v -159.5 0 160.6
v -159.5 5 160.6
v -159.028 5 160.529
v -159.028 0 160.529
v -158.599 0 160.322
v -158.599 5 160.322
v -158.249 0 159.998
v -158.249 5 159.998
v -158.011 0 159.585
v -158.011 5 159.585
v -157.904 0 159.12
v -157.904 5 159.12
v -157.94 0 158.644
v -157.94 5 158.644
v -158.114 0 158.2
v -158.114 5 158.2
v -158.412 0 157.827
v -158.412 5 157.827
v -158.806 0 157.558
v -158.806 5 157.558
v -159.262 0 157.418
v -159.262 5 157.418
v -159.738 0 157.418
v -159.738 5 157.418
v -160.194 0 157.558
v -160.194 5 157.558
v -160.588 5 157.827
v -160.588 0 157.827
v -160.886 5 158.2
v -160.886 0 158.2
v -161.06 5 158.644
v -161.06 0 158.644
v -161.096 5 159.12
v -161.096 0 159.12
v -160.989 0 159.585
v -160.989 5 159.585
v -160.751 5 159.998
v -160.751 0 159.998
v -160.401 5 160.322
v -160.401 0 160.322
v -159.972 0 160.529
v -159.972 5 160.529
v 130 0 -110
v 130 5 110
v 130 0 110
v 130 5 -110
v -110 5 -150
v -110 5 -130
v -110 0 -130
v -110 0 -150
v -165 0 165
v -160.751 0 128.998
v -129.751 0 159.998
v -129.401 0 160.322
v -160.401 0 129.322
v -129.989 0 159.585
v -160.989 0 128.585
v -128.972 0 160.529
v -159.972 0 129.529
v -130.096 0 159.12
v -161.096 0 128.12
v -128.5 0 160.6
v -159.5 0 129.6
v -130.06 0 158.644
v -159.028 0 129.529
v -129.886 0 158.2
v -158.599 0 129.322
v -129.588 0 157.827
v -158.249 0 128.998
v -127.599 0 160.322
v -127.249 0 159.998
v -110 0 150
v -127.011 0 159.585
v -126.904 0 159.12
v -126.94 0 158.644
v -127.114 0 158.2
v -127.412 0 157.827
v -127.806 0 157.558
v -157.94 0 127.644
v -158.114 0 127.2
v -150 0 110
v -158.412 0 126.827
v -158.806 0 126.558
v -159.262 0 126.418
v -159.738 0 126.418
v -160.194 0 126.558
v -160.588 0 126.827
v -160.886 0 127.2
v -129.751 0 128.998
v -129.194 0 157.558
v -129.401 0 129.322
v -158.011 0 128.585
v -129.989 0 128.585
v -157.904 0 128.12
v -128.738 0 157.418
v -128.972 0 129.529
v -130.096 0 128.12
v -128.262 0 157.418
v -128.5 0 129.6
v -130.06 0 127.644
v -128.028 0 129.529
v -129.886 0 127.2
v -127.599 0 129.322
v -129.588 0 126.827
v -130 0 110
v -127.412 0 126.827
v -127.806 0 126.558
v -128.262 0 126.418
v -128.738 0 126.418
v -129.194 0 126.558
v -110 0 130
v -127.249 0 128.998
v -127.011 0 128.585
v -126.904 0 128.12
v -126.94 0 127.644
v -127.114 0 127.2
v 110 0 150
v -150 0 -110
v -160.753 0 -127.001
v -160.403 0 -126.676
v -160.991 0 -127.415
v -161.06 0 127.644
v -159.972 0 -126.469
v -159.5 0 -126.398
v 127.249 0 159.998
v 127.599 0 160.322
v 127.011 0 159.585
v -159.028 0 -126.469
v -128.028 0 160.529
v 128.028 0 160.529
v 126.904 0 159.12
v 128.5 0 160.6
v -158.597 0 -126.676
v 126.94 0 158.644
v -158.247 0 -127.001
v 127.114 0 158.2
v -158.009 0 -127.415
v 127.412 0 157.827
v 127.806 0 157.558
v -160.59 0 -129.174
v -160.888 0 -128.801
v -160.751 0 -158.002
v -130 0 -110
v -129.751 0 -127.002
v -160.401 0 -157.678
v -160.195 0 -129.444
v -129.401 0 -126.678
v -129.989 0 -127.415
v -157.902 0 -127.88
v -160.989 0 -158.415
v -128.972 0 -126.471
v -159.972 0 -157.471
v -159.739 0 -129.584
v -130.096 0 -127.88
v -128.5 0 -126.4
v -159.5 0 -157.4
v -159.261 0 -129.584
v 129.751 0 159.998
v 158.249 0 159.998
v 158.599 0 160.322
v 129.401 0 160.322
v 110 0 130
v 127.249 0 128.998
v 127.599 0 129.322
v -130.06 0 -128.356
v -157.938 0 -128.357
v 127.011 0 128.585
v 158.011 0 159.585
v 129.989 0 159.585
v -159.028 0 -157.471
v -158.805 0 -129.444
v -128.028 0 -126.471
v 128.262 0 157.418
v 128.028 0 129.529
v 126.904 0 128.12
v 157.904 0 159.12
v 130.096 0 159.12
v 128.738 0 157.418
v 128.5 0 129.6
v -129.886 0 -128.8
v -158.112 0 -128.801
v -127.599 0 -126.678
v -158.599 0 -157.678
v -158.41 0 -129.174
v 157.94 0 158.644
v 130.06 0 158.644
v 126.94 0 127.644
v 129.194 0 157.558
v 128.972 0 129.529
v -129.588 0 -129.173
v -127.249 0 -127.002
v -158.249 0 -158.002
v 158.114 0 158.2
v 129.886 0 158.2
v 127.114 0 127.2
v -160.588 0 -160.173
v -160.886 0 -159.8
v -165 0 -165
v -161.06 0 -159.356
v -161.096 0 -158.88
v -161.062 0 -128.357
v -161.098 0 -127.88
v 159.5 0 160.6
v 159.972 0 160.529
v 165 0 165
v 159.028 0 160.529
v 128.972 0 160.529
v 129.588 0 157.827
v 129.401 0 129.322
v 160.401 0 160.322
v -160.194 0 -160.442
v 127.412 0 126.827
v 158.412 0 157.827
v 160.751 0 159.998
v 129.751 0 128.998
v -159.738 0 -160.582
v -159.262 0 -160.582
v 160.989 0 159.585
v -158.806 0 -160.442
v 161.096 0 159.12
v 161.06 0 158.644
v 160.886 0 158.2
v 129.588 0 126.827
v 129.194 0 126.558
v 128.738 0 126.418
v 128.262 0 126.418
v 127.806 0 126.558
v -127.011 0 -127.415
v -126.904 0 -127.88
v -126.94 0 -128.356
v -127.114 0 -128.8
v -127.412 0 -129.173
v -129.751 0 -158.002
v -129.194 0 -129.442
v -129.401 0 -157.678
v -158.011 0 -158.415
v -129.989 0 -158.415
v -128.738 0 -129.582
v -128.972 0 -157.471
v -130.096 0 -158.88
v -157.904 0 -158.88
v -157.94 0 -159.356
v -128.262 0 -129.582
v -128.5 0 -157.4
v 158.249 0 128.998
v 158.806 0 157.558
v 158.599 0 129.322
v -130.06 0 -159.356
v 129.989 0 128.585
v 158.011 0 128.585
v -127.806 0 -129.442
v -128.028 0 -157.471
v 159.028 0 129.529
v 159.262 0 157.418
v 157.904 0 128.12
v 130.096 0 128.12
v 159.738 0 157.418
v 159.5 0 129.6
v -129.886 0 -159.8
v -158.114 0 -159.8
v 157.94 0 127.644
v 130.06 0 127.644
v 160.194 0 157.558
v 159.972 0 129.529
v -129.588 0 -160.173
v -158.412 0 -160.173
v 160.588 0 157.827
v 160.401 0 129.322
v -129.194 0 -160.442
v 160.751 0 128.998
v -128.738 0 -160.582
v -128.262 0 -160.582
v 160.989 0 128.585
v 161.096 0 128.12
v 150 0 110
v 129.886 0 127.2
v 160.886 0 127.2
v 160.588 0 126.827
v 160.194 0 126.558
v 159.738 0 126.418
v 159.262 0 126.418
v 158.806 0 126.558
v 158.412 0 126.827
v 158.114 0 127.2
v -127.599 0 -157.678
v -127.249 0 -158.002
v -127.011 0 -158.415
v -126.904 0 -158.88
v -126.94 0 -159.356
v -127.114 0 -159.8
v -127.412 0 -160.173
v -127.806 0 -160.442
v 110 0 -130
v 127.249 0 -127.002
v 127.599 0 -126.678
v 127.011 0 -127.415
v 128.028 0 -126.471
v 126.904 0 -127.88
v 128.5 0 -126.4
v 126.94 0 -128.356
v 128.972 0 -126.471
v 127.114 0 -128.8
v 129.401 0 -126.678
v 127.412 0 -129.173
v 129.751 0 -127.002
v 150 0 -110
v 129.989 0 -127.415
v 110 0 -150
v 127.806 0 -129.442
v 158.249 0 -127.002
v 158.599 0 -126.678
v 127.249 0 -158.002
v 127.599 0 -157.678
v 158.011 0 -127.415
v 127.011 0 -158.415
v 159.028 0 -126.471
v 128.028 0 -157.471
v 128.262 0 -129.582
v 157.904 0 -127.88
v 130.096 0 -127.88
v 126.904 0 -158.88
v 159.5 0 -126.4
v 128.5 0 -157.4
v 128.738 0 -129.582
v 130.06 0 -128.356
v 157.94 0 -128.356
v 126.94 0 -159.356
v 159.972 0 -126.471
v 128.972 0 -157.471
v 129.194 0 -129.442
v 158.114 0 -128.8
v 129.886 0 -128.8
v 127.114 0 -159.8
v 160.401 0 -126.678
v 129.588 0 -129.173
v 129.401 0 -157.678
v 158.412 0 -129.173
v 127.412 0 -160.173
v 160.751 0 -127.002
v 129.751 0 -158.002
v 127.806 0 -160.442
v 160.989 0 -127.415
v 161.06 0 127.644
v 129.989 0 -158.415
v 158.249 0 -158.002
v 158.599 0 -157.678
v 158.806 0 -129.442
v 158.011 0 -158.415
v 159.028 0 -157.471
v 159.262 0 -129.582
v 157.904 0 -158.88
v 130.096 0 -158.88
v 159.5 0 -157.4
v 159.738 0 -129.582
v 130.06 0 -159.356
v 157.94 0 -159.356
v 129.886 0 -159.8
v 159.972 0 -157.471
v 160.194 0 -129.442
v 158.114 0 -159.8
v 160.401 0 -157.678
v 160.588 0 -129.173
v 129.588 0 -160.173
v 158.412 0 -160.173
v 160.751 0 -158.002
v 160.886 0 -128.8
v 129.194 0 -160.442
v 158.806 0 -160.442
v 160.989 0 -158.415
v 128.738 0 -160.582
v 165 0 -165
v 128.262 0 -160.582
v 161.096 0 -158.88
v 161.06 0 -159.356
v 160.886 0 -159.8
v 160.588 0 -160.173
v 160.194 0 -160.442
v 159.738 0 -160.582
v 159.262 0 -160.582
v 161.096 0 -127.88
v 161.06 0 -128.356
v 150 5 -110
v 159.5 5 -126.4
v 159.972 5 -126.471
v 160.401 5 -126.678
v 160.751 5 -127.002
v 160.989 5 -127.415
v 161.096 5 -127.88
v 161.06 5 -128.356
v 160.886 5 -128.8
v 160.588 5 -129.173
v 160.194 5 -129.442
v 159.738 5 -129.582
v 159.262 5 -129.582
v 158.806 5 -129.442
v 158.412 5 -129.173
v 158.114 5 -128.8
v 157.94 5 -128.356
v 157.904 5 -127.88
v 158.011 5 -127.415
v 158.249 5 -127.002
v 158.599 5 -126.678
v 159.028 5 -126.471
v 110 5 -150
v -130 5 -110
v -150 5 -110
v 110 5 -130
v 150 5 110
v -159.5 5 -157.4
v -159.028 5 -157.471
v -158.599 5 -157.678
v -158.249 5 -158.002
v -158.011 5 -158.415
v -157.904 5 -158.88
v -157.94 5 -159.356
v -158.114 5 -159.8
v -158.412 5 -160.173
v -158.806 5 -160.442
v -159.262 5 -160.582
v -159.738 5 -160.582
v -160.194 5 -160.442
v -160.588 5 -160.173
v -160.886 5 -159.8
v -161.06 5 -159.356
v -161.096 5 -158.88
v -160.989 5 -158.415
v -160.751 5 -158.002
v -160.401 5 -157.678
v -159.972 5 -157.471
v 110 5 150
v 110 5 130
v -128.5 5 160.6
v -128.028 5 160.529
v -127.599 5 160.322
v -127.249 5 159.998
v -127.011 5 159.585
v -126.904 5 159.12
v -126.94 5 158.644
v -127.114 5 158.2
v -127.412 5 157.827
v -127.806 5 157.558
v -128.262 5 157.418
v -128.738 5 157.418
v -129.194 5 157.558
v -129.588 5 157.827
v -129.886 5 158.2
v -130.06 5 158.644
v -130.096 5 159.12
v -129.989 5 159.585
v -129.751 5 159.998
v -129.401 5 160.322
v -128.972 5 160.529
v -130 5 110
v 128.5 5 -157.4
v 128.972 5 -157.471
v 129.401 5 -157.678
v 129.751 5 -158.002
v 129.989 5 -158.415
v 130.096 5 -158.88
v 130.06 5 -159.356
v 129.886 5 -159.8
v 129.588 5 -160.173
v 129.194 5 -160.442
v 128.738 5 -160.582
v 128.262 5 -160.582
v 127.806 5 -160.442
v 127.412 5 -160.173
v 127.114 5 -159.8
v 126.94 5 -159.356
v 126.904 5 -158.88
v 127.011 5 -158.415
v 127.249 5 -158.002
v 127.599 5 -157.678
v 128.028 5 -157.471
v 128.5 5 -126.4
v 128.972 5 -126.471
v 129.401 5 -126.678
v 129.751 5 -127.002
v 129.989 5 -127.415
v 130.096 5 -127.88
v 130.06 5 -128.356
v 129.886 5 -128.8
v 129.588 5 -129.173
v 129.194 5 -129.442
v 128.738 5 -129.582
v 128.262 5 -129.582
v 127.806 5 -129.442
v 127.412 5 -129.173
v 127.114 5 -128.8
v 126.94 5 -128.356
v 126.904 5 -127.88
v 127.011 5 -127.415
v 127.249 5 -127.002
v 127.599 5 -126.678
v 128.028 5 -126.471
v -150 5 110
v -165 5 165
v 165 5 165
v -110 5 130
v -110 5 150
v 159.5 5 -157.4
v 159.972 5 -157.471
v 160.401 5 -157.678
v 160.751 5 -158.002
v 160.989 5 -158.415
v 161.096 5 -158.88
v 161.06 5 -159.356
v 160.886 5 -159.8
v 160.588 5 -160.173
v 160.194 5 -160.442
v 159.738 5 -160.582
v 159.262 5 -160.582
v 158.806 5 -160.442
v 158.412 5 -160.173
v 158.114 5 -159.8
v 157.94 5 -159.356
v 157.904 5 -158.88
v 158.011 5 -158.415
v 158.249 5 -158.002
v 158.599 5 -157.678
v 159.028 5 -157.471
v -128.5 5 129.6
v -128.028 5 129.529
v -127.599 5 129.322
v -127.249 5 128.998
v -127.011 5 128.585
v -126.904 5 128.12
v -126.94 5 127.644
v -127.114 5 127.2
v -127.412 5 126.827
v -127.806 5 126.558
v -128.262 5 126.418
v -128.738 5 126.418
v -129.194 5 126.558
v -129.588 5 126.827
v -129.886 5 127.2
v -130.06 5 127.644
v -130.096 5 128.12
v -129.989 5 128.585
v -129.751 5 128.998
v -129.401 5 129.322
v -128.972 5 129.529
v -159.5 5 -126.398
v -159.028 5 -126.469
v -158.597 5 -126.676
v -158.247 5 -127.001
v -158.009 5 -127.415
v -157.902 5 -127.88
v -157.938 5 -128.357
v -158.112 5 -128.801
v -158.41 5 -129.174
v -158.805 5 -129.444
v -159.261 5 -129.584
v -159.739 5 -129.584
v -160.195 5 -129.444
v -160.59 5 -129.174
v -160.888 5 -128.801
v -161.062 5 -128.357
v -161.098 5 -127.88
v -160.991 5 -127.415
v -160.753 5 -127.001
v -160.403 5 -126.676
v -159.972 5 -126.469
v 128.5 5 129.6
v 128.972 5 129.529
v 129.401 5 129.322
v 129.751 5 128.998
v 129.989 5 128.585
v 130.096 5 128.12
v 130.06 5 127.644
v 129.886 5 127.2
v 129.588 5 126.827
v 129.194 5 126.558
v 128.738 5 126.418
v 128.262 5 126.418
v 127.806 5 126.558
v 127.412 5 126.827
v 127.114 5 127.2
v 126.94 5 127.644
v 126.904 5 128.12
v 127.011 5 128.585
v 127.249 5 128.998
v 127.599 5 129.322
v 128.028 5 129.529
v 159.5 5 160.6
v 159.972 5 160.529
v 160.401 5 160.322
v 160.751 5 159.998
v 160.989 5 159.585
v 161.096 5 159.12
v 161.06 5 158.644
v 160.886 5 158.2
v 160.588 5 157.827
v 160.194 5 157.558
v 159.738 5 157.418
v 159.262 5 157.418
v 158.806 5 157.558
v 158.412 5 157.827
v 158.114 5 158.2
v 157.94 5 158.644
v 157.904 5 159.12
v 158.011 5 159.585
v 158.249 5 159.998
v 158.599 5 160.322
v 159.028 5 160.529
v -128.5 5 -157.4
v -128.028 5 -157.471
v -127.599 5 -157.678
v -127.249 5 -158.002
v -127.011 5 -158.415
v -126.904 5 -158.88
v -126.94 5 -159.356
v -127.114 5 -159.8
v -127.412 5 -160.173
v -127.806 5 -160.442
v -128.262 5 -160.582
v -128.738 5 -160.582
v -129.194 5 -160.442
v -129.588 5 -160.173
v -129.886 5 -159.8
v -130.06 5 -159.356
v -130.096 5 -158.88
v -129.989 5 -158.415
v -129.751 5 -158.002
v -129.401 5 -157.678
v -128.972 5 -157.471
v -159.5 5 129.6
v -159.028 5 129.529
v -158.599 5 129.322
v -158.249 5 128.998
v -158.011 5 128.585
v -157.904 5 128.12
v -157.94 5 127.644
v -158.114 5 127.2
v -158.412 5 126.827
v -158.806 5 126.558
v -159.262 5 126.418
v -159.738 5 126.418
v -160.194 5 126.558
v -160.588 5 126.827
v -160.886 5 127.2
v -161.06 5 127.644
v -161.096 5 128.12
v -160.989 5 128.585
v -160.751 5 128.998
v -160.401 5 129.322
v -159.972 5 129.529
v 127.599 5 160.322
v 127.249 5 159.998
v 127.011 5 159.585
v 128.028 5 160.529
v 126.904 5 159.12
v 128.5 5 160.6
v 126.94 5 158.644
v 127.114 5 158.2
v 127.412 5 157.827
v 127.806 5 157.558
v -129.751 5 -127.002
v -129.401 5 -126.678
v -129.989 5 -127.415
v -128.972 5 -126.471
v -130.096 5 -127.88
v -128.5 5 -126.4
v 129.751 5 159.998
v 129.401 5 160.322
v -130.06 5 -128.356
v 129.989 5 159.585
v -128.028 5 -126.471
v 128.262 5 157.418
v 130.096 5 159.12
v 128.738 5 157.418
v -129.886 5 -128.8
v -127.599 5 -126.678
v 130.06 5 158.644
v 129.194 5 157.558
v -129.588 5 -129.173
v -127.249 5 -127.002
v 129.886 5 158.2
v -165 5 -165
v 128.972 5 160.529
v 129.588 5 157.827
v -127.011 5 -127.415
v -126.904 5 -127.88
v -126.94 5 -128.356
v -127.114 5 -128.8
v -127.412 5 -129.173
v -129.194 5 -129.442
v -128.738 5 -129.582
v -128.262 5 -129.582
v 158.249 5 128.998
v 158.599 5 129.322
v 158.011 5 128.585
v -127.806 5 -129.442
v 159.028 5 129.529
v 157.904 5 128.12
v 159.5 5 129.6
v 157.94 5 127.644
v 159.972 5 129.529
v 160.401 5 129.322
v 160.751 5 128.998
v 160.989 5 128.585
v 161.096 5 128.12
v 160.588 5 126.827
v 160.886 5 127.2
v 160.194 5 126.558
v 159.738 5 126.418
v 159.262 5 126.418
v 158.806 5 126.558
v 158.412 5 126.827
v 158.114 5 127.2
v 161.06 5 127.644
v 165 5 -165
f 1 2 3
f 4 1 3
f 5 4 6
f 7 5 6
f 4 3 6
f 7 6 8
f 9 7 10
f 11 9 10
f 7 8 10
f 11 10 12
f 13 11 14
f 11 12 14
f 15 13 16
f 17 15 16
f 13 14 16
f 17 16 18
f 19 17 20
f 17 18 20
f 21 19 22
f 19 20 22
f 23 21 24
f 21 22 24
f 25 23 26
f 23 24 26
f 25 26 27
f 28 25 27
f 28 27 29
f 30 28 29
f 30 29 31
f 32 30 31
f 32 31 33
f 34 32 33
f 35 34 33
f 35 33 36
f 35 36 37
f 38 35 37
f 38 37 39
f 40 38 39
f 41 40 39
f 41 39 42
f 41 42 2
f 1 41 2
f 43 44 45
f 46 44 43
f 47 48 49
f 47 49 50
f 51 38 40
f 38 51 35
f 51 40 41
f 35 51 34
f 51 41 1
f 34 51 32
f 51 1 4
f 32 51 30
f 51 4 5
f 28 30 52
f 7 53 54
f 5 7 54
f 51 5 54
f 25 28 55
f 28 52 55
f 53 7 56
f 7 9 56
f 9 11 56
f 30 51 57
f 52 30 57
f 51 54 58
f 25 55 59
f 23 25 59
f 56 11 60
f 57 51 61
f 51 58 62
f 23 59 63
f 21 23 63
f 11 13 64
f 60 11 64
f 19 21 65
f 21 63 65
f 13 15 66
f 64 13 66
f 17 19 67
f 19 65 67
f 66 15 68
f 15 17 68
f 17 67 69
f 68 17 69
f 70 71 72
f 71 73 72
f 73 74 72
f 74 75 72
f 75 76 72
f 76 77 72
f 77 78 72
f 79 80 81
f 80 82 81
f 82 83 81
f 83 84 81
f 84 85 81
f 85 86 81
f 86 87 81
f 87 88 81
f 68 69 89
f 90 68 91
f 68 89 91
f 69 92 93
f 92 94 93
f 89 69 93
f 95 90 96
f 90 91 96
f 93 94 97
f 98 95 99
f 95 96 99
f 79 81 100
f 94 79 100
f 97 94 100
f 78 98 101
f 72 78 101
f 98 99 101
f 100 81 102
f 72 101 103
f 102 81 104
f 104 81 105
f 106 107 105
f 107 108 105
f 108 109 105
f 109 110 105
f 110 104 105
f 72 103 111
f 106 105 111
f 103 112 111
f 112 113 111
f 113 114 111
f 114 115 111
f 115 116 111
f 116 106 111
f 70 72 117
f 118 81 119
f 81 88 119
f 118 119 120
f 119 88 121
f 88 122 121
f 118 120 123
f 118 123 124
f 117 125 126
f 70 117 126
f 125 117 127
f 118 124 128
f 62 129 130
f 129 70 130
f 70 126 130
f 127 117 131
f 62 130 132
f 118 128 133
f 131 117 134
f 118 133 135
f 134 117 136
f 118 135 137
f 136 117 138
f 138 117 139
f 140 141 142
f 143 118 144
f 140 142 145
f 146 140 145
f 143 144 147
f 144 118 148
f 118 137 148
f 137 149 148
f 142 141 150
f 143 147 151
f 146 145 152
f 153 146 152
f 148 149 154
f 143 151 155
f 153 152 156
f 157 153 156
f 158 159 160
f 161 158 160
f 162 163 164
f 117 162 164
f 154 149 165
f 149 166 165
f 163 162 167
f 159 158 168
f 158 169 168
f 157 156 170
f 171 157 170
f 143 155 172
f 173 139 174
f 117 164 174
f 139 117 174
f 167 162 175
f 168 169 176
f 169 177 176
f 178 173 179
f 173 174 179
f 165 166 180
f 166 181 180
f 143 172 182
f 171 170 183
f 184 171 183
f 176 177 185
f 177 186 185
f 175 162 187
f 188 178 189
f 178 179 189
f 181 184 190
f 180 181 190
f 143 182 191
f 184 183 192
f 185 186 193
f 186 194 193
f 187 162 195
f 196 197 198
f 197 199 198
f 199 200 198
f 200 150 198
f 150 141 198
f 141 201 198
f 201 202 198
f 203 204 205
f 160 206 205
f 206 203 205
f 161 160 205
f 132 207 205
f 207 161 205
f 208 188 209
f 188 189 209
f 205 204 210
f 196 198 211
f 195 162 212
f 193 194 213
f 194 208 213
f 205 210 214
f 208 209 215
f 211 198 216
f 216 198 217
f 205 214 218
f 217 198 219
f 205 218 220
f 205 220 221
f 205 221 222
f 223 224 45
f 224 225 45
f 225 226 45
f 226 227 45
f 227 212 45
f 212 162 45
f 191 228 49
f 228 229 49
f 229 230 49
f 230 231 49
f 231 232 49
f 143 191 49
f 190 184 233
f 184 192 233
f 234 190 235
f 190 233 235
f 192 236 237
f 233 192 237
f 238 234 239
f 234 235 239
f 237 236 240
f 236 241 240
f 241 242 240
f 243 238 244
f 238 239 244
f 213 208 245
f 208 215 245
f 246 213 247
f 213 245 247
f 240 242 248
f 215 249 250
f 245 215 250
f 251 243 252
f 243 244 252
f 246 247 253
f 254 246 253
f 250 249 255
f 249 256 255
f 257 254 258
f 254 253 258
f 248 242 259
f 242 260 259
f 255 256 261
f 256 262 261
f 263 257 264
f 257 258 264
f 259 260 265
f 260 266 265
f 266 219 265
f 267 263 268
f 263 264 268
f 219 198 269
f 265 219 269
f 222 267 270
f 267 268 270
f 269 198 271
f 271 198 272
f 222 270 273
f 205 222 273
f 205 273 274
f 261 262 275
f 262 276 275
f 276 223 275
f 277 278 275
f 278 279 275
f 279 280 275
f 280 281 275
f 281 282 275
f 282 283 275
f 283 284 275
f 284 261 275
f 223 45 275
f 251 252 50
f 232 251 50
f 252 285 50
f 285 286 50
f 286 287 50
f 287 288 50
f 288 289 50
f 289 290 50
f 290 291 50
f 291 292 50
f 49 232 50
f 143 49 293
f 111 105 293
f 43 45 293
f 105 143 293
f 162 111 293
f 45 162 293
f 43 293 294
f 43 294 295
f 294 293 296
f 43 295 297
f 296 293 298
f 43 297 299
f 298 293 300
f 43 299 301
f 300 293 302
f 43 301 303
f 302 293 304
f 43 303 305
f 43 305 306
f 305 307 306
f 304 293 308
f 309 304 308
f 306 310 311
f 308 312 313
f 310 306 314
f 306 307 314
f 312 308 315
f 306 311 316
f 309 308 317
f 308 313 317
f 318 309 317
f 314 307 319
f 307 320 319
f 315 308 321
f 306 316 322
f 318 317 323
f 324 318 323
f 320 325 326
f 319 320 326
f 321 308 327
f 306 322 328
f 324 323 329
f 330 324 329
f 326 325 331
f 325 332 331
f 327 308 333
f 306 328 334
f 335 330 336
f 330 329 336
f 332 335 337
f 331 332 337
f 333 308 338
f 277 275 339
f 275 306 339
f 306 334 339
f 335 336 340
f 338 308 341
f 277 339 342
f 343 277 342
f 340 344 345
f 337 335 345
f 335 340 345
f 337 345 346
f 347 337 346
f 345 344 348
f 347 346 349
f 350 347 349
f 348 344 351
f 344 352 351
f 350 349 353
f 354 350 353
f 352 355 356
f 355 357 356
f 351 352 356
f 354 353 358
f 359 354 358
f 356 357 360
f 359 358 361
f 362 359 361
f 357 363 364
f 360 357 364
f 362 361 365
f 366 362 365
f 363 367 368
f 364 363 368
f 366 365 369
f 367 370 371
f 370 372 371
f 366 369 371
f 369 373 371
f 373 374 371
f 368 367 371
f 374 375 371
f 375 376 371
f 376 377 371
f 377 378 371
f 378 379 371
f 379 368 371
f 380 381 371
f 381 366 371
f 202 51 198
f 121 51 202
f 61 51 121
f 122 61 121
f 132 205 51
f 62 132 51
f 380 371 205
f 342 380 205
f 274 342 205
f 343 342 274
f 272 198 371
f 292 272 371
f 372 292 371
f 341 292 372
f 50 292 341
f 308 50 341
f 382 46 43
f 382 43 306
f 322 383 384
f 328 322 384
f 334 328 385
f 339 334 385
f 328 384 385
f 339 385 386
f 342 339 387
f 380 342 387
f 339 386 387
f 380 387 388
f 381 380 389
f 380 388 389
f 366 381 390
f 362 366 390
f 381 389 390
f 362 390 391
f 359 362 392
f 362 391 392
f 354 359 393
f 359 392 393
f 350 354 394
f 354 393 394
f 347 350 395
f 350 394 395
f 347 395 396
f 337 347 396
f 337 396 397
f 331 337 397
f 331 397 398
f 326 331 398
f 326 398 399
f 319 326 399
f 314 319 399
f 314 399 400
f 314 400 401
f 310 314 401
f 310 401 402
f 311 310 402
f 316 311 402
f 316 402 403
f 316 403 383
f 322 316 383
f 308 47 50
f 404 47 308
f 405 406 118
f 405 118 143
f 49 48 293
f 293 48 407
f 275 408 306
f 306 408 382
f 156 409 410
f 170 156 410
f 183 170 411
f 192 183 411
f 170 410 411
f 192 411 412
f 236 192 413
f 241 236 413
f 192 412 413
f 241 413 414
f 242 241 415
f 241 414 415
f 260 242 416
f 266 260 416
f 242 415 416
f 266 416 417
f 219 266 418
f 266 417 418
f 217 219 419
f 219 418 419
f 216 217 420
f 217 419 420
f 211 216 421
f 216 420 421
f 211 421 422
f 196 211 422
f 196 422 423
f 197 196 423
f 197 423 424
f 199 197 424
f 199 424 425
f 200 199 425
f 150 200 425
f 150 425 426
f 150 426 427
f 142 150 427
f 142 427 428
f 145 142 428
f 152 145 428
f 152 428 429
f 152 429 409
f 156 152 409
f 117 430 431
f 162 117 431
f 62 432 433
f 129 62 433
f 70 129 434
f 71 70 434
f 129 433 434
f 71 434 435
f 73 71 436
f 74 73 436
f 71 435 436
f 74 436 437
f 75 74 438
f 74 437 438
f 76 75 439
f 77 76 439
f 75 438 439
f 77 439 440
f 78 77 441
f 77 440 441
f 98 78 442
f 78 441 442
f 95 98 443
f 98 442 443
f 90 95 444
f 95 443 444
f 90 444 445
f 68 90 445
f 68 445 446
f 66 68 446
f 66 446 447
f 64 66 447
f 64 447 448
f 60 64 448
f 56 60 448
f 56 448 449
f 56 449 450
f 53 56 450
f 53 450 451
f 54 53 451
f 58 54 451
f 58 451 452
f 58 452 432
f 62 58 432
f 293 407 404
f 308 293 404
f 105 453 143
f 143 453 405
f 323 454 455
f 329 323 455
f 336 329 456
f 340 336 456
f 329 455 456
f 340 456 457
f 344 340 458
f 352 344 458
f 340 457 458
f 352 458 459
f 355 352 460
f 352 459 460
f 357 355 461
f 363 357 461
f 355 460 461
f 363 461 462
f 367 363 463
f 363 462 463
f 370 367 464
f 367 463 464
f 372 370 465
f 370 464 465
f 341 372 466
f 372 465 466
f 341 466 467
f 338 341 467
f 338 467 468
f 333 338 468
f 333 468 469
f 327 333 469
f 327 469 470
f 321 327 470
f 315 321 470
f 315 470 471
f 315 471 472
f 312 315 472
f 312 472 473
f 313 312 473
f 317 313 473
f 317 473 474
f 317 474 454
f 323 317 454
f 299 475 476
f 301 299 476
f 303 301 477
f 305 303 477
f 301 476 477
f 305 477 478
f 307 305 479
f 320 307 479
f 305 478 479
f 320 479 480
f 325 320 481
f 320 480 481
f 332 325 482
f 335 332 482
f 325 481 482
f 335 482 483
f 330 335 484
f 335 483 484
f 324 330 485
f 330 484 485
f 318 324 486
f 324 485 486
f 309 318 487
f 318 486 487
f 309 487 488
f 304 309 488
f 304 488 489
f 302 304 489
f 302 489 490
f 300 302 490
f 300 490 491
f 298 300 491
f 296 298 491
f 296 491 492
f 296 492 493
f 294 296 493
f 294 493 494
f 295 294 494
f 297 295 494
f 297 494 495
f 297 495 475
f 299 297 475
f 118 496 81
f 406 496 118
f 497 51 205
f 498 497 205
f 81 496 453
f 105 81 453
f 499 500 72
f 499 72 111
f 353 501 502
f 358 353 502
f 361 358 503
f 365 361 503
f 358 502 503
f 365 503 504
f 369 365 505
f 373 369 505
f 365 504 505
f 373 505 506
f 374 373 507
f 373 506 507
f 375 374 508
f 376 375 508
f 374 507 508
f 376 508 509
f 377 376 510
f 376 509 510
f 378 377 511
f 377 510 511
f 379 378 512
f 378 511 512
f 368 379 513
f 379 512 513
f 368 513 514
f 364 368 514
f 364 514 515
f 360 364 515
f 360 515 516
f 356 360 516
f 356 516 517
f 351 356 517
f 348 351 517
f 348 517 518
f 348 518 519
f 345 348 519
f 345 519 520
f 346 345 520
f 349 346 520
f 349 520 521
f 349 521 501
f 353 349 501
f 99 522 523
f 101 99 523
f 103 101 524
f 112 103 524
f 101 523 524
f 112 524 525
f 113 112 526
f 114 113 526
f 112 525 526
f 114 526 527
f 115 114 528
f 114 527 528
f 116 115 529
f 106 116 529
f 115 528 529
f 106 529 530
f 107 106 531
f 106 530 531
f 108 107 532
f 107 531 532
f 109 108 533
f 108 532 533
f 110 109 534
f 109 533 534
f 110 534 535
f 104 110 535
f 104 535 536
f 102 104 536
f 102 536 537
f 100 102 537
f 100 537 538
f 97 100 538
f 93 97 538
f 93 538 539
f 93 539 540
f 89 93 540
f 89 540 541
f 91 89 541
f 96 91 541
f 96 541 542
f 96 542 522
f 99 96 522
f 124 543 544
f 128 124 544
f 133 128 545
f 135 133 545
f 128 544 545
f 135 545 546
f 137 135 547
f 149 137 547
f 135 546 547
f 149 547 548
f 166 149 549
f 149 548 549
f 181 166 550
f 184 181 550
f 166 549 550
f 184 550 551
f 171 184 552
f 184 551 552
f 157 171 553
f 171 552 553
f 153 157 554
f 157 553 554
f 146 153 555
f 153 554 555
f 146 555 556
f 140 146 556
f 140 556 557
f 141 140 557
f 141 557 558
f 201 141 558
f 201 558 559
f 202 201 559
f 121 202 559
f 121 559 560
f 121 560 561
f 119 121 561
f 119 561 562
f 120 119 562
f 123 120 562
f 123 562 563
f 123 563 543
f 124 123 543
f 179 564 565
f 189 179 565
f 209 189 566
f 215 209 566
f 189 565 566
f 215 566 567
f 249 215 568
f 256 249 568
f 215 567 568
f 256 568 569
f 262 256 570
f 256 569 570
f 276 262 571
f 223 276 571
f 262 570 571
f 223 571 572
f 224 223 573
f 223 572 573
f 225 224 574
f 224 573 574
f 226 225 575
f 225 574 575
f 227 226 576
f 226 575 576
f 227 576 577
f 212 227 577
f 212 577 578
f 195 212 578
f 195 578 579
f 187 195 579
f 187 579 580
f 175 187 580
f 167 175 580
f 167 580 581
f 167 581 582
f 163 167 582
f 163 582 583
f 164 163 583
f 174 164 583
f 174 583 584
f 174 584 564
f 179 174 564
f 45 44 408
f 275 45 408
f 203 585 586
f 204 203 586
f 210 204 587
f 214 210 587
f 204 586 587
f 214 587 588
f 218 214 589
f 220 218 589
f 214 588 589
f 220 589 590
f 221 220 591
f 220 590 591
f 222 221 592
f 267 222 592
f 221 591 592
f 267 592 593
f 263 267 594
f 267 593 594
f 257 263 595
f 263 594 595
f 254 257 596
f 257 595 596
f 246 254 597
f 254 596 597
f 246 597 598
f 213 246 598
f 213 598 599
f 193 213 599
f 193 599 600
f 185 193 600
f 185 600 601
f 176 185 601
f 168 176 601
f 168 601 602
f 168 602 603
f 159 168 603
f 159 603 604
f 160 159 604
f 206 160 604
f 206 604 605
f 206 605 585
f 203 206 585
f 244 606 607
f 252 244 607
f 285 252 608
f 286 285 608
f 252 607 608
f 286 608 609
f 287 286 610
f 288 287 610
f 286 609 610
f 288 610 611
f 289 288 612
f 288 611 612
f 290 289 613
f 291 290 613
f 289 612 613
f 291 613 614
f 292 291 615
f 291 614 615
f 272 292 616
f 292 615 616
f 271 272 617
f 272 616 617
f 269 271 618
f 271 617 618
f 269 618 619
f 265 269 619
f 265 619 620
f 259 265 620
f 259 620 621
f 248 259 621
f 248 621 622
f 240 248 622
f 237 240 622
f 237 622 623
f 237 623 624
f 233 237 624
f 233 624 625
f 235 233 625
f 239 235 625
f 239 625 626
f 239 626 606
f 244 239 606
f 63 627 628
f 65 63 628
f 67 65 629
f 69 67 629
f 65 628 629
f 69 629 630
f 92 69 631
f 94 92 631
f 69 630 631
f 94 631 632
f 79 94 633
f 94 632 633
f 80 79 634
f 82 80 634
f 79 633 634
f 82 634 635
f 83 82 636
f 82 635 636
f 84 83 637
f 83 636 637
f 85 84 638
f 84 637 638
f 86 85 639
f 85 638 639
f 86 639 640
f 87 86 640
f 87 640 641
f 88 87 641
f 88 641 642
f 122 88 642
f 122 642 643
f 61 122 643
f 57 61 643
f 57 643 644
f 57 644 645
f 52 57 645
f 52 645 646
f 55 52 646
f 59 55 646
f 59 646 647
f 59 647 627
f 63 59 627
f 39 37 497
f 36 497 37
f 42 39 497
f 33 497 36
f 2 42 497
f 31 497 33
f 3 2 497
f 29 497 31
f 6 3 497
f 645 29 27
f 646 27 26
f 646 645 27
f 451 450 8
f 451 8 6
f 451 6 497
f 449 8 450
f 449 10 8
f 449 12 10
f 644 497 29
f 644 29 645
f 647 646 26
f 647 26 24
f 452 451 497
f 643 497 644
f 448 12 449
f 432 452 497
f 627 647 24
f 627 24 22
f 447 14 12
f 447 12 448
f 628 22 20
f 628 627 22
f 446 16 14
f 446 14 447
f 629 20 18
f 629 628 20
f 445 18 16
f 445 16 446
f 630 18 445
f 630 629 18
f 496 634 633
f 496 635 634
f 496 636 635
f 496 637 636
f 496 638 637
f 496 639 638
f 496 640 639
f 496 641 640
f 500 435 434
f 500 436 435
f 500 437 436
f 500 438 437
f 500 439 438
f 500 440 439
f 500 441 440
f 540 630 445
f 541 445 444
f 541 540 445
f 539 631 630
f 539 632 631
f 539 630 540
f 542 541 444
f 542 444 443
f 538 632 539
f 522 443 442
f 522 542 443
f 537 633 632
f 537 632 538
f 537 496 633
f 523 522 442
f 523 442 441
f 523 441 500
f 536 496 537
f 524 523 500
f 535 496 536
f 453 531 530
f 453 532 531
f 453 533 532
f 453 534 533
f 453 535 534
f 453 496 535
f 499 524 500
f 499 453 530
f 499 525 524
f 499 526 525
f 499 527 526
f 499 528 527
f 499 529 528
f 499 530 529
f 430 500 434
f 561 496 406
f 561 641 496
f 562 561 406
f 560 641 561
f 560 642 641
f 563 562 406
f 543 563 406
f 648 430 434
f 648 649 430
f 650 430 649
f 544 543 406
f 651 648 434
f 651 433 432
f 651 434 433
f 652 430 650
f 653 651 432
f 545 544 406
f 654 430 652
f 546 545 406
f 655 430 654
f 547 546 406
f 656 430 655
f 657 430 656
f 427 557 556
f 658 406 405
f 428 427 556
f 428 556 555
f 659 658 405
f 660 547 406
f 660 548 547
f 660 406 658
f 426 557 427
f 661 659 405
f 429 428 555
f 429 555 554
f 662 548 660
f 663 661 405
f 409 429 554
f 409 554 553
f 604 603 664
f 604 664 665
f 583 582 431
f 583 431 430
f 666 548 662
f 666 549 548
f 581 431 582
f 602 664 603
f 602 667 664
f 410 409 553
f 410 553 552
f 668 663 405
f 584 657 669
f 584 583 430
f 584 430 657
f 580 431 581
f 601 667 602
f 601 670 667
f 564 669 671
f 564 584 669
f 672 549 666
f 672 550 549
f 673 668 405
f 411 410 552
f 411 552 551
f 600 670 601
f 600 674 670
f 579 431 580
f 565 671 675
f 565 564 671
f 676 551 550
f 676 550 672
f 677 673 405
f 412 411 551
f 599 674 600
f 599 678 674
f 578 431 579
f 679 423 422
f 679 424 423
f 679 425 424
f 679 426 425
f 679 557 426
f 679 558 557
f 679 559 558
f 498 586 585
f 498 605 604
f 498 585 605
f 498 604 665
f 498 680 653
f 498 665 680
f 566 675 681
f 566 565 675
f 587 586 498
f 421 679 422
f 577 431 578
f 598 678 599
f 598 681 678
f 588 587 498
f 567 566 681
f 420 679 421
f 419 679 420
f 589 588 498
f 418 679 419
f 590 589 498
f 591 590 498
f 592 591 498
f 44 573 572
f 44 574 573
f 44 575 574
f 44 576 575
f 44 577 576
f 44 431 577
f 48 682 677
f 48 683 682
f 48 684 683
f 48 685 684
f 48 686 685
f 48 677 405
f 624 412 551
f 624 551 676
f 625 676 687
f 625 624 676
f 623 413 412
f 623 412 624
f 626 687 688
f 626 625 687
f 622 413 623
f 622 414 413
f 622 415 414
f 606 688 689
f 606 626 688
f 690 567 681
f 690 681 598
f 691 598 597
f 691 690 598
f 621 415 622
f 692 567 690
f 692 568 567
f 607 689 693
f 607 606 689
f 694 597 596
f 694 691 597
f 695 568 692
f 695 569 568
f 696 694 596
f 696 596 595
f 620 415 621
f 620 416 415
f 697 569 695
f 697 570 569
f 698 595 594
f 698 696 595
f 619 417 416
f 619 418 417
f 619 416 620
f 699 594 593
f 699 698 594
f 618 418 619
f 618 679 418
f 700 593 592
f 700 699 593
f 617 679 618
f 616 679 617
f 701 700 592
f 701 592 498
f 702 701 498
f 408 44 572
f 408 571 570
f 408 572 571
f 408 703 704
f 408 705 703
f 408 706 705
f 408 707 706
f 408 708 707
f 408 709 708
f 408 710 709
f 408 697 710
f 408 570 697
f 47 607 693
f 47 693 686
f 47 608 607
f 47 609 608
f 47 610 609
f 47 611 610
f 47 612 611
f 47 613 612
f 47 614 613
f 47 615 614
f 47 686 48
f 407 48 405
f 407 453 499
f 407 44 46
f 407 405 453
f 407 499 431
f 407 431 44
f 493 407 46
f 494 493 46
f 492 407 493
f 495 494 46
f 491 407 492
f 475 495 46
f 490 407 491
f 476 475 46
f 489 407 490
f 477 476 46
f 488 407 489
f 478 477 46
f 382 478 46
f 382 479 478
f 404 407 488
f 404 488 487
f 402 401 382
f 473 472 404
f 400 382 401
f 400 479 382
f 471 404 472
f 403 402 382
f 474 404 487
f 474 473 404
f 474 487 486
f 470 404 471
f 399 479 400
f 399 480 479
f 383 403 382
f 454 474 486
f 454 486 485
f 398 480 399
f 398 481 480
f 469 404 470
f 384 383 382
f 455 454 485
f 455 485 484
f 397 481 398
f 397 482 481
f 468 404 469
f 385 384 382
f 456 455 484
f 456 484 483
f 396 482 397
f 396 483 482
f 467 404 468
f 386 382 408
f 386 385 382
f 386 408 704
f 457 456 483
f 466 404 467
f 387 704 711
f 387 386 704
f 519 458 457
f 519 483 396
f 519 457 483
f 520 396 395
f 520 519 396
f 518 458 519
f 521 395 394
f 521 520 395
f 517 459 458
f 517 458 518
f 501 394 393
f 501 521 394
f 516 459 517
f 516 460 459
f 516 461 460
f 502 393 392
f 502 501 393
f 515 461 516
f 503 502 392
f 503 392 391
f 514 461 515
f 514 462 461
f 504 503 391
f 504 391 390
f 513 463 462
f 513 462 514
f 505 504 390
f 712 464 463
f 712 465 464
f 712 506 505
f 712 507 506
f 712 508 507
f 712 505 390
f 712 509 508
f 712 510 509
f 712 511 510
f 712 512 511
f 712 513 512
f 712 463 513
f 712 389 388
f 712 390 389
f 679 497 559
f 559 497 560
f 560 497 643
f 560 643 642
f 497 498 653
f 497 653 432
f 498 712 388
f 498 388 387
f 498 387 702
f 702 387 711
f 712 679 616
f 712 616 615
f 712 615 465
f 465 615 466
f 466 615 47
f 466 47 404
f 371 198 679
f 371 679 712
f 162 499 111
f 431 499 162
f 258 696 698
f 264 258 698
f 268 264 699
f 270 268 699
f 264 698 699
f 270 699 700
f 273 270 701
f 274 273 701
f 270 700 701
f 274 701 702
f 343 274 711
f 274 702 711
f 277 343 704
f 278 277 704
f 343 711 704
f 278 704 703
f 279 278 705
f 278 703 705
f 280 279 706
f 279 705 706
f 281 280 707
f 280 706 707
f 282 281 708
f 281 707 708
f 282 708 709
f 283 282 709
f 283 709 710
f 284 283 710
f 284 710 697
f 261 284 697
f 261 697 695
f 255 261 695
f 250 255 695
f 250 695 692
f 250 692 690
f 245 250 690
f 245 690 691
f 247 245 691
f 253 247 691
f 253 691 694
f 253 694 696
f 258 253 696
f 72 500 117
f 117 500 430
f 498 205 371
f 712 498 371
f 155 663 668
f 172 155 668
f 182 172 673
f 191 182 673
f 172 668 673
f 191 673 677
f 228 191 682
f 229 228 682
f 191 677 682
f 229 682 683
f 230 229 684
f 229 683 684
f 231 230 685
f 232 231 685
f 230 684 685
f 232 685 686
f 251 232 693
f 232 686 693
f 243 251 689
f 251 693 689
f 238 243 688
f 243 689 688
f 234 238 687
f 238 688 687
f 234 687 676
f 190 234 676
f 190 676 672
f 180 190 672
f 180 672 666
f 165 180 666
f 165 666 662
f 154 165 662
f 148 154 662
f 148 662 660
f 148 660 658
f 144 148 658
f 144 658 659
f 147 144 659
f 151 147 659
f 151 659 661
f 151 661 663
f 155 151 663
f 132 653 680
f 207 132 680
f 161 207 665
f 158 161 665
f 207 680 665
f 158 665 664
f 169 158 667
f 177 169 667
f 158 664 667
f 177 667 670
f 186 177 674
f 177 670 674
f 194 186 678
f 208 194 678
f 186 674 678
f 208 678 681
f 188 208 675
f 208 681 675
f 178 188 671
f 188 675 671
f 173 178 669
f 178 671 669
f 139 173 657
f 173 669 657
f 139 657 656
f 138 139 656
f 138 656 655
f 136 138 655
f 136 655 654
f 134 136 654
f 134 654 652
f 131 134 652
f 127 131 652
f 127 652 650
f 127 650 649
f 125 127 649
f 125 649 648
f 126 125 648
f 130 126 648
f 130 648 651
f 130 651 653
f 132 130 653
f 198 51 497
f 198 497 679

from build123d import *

# Parameters (mm, degrees)
SKETCH_1_W          = 330
SKETCH_1_H          = 330
EXTRUDE_1_DEPTH     = 5
SKETCH_2_R          = 1.6
SKETCH_2_R_2        = 1.602203763
CUT_EXTRUDE_1_DEPTH = 234.39880034
SKETCH_3_W          = 220
SKETCH_3_H          = 20
CUT_EXTRUDE_2_DEPTH = 234.39880034
SKETCH_4_W          = 20
SKETCH_4_H          = 220
CUT_EXTRUDE_3_DEPTH = 234.39880034
SKETCH_7_W          = 220
SKETCH_7_H          = 20
CUT_EXTRUDE_4_DEPTH = 234.39880034
SKETCH_9_W          = 239.54111937
SKETCH_9_H          = 233.56752537
EXTRUDE_2_DEPTH     = 5


with BuildPart() as part:
    # 草图1 → 凸台-拉伸1 (new body)
    with BuildSketch(Plane(origin=(0, 0, 0), x_dir=(1, 0, 0), z_dir=(0, 1, 0))):
        Rectangle(SKETCH_1_W, SKETCH_1_H)
    extrude(amount=EXTRUDE_1_DEPTH)

    # 草图2 → 切除-拉伸1 (cut, through all)
    with BuildSketch(Plane(origin=(0, 5, 0), x_dir=(1, 0, 0), z_dir=(0, 1, 0))):
        with Locations(Location((-159.5, 159, 0), (0, 0, 270))):
            Circle(SKETCH_2_R)
        with Locations(Location((-128.5, 159, 0), (0, 0, 270))):
            Circle(SKETCH_2_R)
        with Locations(Location((-159.5, 128, 0), (0, 0, 270))):
            Circle(SKETCH_2_R_2)
        with Locations(Location((-128.5, 128, 0), (0, 0, 270))):
            Circle(SKETCH_2_R)
        with Locations(Location((128.5, 159, 0), (0, 0, 270))):
            Circle(SKETCH_2_R)
        with Locations(Location((159.5, 159, 0), (0, 0, 270))):
            Circle(SKETCH_2_R)
        with Locations(Location((128.5, 128, 0), (0, 0, 270))):
            Circle(SKETCH_2_R)
        with Locations(Location((159.5, 128, 0), (0, 0, 270))):
            Circle(SKETCH_2_R)
        with Locations(Location((128.5, -128, 0), (0, 0, 270))):
            Circle(SKETCH_2_R)
        with Locations(Location((159.5, -128, 0), (0, 0, 270))):
            Circle(SKETCH_2_R)
        with Locations(Location((159.5, -159, 0), (0, 0, 270))):
            Circle(SKETCH_2_R)
        with Locations(Location((128.5, -159, 0), (0, 0, 270))):
            Circle(SKETCH_2_R)
        with Locations(Location((-128.5, -159, 0), (0, 0, 270))):
            Circle(SKETCH_2_R)
        with Locations(Location((-159.5, -159, 0), (0, 0, 270))):
            Circle(SKETCH_2_R)
        with Locations(Location((-159.5, -128, 0), (0, 0, 270))):
            Circle(SKETCH_2_R)
        with Locations(Location((-128.5, -128, 0), (0, 0, 270))):
            Circle(SKETCH_2_R)
    extrude(amount=-CUT_EXTRUDE_1_DEPTH, mode=Mode.SUBTRACT)

    # 草图3 → 切除-拉伸2 (cut, through all)
    with BuildSketch(Plane(origin=(0, 5, 0), x_dir=(1, 0, 0), z_dir=(0, 1, 0))):
        with Locations((0, 100)):
            Rectangle(SKETCH_3_W, SKETCH_3_H)
        with Locations((0, 50)):
            Rectangle(SKETCH_3_W, SKETCH_3_H)
        Rectangle(SKETCH_3_W, SKETCH_3_H)
        with Locations((0, -50)):
            Rectangle(SKETCH_3_W, SKETCH_3_H)
        with Locations((0, -100)):
            Rectangle(SKETCH_3_W, SKETCH_3_H)
    extrude(amount=-CUT_EXTRUDE_2_DEPTH, mode=Mode.SUBTRACT)

    # 草图4 → 切除-拉伸3 (cut, through all)
    with BuildSketch(Plane(origin=(0, 5, 0), x_dir=(1, 0, 0), z_dir=(0, 1, 0))):
        with Locations((-140, 0)):
            Rectangle(SKETCH_4_W, SKETCH_4_H)
        with Locations((140, 0)):
            Rectangle(SKETCH_4_W, SKETCH_4_H)
    extrude(amount=-CUT_EXTRUDE_3_DEPTH, mode=Mode.SUBTRACT)

    # 草图7 → 切除-拉伸4 (cut, through all)
    with BuildSketch(Plane(origin=(0, 5, 0), x_dir=(1, 0, 0), z_dir=(0, 1, 0))):
        with Locations((0, 140)):
            Rectangle(SKETCH_7_W, SKETCH_7_H)
        with Locations((0, -140)):
            Rectangle(SKETCH_7_W, SKETCH_7_H)
    extrude(amount=-CUT_EXTRUDE_4_DEPTH, mode=Mode.SUBTRACT)

    # 草图9 → 凸台-拉伸2 (add)
    with BuildSketch(Plane(origin=(0, 5, 0), x_dir=(1, 0, 0), z_dir=(0, 1, 0))):
        with Locations((2.0907579, 0.2986797)):
            Rectangle(SKETCH_9_W, SKETCH_9_H)
    extrude(amount=-EXTRUDE_2_DEPTH)


solid = part.part
